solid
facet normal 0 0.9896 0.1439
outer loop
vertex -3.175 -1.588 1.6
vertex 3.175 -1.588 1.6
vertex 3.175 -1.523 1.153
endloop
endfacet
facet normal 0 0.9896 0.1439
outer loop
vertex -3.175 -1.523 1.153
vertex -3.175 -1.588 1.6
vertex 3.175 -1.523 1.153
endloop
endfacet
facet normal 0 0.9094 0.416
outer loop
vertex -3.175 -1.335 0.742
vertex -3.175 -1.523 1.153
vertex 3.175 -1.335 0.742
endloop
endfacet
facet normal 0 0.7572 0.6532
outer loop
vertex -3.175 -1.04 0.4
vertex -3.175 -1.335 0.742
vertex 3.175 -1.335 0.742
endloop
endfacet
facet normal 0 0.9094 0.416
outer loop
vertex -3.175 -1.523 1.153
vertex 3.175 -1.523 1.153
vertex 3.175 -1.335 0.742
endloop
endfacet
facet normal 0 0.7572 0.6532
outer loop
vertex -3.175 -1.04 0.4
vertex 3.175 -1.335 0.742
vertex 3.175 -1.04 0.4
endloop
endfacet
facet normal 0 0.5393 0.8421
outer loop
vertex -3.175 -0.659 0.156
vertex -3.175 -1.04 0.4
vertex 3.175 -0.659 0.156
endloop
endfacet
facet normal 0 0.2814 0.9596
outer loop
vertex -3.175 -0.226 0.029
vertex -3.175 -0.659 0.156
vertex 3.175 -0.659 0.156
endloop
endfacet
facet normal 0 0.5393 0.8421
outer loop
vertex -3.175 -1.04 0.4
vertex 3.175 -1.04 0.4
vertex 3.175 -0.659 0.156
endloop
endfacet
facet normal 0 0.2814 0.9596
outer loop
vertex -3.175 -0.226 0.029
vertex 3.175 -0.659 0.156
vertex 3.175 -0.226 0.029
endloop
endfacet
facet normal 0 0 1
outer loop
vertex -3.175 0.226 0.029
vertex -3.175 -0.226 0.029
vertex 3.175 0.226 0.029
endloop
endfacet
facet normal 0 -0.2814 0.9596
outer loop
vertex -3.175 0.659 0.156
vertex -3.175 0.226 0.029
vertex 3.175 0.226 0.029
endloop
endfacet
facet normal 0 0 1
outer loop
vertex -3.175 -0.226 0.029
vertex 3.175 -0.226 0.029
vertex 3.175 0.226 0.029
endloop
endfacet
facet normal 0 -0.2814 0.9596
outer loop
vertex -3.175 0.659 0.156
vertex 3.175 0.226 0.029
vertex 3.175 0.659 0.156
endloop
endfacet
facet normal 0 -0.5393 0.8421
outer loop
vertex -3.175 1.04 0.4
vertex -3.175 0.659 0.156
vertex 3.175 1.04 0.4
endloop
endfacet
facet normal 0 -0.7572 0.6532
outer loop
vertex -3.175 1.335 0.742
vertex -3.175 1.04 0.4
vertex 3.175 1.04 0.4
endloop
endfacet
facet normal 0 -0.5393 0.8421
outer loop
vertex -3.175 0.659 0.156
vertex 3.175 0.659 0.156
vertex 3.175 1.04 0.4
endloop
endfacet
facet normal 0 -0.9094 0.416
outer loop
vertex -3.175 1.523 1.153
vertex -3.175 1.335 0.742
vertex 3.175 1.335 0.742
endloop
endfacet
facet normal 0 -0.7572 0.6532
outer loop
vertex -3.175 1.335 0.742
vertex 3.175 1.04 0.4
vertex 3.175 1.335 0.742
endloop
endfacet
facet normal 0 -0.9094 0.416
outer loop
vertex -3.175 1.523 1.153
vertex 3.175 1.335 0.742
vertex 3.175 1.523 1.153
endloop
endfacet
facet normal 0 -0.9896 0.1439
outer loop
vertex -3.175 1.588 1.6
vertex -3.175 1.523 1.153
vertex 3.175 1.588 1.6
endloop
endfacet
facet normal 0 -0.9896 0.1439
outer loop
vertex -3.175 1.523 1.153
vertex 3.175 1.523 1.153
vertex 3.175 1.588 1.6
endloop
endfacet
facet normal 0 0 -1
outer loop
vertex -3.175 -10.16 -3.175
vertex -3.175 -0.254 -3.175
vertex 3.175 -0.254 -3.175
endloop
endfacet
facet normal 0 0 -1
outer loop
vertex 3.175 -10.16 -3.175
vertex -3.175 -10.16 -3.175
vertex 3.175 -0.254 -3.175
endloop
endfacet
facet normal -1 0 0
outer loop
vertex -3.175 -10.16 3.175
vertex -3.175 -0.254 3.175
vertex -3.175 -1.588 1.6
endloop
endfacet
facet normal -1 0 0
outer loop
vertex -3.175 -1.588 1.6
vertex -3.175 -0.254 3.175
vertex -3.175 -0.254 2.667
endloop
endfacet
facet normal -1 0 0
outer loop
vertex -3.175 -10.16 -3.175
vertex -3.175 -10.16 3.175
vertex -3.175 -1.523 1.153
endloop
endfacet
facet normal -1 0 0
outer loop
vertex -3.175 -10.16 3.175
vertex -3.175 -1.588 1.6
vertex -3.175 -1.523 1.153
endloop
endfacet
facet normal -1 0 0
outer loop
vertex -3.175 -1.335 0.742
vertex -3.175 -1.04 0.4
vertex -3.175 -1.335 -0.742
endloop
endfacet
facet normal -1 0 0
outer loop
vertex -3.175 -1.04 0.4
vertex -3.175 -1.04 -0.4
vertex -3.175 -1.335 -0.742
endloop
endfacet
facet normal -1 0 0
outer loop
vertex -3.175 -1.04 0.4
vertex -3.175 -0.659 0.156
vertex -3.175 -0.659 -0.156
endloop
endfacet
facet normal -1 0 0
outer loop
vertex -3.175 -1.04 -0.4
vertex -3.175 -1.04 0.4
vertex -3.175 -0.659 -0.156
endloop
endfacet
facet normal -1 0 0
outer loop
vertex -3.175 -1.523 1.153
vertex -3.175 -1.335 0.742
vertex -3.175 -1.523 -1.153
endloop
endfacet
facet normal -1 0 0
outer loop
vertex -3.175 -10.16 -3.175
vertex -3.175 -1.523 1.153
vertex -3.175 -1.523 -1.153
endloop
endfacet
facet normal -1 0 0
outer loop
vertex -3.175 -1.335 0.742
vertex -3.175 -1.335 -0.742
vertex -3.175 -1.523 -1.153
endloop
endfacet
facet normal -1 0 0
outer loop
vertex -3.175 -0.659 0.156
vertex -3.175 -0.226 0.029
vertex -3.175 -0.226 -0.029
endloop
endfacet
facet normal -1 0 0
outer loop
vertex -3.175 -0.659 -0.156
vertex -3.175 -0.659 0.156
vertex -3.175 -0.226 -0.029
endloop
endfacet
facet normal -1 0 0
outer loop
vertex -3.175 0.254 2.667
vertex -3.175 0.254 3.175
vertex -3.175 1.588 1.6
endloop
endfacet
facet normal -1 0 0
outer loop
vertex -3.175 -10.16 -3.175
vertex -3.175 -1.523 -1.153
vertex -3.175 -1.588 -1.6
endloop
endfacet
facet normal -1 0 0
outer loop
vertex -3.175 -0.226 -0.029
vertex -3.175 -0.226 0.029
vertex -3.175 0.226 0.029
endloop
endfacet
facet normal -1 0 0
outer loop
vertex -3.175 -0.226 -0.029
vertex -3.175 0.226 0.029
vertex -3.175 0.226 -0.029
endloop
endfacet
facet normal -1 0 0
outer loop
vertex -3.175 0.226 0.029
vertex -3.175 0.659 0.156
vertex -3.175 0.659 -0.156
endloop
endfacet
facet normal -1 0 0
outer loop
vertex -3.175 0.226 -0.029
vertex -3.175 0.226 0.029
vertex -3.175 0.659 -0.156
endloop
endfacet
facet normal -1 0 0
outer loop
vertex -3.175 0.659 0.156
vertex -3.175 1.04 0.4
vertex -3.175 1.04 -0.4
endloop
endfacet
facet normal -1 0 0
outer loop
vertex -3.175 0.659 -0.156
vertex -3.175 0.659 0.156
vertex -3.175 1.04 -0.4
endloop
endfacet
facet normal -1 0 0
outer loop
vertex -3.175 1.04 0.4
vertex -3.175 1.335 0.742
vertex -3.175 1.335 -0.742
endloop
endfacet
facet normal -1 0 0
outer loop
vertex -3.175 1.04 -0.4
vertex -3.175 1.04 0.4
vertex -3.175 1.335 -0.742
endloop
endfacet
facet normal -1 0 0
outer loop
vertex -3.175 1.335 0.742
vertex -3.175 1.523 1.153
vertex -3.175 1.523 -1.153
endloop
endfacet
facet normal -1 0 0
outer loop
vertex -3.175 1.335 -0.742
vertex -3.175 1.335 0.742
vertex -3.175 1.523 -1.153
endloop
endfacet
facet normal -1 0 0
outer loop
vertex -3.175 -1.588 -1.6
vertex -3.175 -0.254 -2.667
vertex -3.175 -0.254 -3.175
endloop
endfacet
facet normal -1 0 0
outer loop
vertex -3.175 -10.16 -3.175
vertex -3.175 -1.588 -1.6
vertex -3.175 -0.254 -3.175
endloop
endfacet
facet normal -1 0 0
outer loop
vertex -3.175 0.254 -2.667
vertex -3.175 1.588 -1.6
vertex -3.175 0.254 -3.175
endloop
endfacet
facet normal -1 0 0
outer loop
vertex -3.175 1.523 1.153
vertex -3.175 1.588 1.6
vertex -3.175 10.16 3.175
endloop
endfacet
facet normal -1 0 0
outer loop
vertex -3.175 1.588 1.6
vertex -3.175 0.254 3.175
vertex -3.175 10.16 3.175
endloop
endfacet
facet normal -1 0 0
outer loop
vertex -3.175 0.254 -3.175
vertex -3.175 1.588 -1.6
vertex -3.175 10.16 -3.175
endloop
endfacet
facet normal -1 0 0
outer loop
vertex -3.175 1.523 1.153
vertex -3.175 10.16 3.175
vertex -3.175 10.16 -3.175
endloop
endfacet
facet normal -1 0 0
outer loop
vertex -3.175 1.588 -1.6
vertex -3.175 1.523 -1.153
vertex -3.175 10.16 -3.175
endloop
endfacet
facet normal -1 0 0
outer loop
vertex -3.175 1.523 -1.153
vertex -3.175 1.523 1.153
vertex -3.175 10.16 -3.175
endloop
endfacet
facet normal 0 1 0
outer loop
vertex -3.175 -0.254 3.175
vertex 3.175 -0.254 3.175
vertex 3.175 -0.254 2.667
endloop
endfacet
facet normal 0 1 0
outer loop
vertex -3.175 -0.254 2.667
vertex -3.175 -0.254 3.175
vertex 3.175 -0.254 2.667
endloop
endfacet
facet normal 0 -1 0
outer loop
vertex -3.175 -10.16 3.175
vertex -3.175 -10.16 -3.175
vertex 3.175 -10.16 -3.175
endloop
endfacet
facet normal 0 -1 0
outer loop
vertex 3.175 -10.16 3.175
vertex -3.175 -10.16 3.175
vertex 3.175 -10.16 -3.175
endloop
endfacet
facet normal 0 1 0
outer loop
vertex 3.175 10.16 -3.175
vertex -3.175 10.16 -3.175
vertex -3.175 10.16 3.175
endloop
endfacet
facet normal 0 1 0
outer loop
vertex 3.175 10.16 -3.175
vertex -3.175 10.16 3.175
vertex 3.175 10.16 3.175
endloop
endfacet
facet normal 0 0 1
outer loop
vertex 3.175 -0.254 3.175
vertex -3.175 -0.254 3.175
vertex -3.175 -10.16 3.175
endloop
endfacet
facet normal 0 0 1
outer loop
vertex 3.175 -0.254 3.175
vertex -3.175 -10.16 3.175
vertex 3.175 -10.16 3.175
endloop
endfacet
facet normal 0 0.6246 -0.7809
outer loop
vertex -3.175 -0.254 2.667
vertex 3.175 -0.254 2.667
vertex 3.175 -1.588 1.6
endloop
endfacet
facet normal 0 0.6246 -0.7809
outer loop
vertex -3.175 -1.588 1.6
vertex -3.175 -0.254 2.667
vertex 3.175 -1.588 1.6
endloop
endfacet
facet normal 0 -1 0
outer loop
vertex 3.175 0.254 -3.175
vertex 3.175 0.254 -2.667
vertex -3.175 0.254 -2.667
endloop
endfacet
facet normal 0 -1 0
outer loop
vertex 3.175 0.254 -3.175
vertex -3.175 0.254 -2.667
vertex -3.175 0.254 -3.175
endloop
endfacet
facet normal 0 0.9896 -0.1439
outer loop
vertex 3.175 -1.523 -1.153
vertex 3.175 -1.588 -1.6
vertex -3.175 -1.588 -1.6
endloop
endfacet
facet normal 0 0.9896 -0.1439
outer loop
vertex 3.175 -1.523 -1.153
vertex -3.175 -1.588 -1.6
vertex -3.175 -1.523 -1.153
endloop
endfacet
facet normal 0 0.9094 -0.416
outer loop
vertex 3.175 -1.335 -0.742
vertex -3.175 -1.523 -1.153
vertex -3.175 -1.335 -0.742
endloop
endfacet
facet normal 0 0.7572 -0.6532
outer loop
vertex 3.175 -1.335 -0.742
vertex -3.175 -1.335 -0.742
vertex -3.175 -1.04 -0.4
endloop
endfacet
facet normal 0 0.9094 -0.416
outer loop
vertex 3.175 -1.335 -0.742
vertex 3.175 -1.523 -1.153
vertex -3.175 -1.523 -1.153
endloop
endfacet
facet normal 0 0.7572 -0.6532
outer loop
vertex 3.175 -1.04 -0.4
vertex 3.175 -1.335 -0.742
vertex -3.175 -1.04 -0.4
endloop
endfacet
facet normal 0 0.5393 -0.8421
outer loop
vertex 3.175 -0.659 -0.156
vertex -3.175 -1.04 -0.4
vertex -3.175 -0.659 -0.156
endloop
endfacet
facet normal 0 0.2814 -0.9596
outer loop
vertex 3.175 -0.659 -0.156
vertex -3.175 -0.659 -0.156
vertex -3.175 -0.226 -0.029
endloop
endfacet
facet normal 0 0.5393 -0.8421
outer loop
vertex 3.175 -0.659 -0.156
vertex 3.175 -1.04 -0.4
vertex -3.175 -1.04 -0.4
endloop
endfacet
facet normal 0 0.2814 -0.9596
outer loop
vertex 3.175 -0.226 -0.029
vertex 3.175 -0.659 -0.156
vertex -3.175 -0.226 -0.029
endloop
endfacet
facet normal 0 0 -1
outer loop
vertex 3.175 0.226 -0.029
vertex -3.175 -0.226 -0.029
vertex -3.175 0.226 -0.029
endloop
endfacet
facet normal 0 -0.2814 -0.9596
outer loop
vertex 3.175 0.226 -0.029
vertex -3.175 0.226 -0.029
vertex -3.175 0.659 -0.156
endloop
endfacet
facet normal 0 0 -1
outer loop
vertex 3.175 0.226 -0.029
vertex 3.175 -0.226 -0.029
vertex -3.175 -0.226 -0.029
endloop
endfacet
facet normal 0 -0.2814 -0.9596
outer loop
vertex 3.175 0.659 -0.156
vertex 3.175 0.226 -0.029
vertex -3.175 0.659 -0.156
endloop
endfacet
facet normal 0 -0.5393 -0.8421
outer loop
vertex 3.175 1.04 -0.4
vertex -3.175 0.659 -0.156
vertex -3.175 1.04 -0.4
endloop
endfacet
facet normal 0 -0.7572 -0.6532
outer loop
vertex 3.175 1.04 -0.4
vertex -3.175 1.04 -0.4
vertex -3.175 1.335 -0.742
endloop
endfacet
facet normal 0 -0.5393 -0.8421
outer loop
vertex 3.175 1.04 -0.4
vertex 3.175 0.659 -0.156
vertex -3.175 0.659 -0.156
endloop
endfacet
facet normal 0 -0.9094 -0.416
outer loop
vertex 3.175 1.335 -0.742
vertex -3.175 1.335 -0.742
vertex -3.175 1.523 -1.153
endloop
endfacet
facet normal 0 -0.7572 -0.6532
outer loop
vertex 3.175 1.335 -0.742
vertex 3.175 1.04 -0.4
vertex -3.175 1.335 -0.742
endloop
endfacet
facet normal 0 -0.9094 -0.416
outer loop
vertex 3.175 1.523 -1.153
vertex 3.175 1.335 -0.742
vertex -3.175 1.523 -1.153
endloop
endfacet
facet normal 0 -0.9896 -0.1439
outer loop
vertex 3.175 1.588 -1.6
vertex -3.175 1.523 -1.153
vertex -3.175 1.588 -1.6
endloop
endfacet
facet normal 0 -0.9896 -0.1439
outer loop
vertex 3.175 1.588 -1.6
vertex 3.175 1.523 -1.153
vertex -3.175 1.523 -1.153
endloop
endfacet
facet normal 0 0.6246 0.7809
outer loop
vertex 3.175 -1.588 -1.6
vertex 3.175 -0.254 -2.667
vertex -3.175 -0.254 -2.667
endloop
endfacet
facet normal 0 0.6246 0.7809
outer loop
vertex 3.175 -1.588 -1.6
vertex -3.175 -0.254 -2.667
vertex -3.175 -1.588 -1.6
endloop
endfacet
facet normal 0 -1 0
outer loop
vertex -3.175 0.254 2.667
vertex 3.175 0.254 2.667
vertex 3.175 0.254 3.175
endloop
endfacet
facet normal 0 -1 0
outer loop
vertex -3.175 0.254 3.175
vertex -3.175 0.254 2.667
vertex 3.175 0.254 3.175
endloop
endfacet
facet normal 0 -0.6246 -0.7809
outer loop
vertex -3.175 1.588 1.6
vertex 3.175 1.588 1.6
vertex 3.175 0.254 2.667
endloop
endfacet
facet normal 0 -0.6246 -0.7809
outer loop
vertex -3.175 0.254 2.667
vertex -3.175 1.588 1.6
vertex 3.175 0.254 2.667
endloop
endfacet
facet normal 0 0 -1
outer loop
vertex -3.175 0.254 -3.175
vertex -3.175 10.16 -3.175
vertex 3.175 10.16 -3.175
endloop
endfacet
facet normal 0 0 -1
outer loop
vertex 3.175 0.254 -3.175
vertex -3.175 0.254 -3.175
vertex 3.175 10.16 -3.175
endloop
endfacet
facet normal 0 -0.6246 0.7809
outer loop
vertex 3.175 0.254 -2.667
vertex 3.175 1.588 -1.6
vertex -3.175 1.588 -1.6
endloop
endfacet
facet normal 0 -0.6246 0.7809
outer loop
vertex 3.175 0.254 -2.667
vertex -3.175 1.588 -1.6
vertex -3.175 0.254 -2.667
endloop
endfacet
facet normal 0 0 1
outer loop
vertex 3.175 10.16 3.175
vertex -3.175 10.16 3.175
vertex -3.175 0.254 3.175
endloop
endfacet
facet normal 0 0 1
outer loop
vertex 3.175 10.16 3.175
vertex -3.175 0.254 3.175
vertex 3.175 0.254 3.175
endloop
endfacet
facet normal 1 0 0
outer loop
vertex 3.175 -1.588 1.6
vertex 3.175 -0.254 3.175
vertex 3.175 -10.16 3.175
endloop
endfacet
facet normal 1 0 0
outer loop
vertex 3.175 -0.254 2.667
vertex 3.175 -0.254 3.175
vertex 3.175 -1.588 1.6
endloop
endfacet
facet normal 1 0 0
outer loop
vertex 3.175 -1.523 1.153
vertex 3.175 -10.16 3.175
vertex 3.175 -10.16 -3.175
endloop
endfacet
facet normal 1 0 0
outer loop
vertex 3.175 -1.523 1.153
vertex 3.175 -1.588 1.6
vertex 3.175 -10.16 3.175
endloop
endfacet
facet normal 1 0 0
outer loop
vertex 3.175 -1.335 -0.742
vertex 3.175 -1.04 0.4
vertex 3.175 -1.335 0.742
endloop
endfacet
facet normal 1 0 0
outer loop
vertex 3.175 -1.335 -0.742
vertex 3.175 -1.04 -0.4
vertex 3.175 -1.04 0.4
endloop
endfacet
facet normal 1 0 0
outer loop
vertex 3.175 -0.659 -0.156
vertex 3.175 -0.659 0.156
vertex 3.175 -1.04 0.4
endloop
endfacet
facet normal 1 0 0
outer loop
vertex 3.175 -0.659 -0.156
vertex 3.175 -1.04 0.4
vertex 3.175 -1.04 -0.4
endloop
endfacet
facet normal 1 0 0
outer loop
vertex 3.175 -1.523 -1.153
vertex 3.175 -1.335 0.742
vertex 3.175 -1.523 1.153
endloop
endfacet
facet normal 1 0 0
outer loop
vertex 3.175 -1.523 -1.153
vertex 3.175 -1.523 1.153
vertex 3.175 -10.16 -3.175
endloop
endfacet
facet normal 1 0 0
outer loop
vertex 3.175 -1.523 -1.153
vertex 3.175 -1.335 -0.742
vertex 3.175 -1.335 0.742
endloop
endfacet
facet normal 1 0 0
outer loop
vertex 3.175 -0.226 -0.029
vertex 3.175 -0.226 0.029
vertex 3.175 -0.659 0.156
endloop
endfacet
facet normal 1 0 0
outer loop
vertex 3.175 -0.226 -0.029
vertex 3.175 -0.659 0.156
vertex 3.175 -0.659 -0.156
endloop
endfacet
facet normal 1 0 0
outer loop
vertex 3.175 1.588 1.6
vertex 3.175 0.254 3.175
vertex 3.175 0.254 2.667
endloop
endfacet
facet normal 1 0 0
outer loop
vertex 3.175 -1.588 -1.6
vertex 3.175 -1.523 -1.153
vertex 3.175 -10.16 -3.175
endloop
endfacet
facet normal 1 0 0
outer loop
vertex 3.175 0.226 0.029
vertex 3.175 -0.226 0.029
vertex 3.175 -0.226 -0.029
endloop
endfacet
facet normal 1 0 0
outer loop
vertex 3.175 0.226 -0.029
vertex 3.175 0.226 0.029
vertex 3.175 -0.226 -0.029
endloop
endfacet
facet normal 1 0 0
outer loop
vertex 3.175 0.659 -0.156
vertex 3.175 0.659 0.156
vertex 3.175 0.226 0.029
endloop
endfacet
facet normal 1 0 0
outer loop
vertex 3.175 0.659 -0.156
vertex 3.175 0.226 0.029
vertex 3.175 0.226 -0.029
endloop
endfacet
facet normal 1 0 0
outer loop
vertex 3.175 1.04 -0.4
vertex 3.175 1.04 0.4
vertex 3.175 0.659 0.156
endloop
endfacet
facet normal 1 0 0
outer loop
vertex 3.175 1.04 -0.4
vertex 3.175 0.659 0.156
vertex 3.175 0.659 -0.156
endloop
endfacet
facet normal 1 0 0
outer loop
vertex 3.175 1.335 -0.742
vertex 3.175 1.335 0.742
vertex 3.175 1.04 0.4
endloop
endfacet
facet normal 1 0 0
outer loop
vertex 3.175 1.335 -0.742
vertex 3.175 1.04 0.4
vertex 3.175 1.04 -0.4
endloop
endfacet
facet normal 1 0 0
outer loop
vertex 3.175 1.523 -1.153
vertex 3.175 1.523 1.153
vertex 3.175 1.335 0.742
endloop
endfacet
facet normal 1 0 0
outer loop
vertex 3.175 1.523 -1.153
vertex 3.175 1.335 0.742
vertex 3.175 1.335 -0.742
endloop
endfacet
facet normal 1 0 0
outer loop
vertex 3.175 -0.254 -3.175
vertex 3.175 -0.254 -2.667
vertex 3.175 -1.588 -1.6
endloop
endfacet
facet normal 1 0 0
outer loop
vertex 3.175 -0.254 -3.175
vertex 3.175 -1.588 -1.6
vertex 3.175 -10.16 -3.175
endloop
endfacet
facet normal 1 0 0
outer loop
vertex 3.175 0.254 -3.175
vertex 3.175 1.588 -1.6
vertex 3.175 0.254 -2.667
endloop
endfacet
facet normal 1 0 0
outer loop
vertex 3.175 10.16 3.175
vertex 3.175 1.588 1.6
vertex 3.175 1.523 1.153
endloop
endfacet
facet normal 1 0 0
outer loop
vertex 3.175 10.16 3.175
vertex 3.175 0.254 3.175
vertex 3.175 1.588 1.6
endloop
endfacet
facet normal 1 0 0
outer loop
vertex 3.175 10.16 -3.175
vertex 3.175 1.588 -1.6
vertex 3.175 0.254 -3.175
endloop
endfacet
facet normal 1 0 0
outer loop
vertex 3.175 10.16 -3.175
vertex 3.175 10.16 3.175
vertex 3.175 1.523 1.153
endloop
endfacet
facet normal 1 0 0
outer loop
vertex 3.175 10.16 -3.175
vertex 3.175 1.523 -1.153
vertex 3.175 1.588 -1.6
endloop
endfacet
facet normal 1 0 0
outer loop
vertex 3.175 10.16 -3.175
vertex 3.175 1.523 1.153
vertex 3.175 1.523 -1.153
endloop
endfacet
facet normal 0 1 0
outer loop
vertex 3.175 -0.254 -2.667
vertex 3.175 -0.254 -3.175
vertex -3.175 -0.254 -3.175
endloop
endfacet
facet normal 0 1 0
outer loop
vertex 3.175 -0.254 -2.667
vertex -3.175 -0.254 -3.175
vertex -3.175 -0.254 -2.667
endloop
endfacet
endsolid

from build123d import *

# Parameters (mm, degrees)
SKETCH1_W           = 6.35
SKETCH1_H           = 6.35
BOSS_EXTRUDE1_DEPTH = 10.16
CUT_EXTRUDE1_DEPTH  = 6.35


with BuildPart() as part:
    # Sketch1 → Boss-Extrude1 (new body, symmetric)
    with BuildSketch(Plane(origin=(0, 0, 0), x_dir=(1, 0, 0), z_dir=(0, 1, 0))):
        Rectangle(SKETCH1_W, SKETCH1_H)
    extrude(amount=BOSS_EXTRUDE1_DEPTH, both=True)

    # Sketch2 → Cut-Extrude1 (cut)
    with BuildSketch(Plane(origin=(3.175, 0, 0), x_dir=(0, 0, -1), z_dir=(1, 0, 0))):
        with BuildLine():
            Line((-3.175, 0.254), (-3.175, -0.254))
            Line((-3.175, -0.254), (-2.667, -0.254))
            Line((-2.667, -0.254), (-1.6002, -1.5875))
            ThreePointArc((-1.6002, -1.5875), (-0.0127, 0), (-1.6002, 1.5875))
            Line((-1.6002, 1.5875), (-2.667, 0.254))
            Line((-2.667, 0.254), (-3.175, 0.254))
        make_face()
    cut_extrude1 = extrude(amount=-CUT_EXTRUDE1_DEPTH, mode=Mode.SUBTRACT)

    # Mirror1: Cut-Extrude1 across plane
    add(cut_extrude1.mirror(Plane.XY), mode=Mode.SUBTRACT)


solid = part.part
